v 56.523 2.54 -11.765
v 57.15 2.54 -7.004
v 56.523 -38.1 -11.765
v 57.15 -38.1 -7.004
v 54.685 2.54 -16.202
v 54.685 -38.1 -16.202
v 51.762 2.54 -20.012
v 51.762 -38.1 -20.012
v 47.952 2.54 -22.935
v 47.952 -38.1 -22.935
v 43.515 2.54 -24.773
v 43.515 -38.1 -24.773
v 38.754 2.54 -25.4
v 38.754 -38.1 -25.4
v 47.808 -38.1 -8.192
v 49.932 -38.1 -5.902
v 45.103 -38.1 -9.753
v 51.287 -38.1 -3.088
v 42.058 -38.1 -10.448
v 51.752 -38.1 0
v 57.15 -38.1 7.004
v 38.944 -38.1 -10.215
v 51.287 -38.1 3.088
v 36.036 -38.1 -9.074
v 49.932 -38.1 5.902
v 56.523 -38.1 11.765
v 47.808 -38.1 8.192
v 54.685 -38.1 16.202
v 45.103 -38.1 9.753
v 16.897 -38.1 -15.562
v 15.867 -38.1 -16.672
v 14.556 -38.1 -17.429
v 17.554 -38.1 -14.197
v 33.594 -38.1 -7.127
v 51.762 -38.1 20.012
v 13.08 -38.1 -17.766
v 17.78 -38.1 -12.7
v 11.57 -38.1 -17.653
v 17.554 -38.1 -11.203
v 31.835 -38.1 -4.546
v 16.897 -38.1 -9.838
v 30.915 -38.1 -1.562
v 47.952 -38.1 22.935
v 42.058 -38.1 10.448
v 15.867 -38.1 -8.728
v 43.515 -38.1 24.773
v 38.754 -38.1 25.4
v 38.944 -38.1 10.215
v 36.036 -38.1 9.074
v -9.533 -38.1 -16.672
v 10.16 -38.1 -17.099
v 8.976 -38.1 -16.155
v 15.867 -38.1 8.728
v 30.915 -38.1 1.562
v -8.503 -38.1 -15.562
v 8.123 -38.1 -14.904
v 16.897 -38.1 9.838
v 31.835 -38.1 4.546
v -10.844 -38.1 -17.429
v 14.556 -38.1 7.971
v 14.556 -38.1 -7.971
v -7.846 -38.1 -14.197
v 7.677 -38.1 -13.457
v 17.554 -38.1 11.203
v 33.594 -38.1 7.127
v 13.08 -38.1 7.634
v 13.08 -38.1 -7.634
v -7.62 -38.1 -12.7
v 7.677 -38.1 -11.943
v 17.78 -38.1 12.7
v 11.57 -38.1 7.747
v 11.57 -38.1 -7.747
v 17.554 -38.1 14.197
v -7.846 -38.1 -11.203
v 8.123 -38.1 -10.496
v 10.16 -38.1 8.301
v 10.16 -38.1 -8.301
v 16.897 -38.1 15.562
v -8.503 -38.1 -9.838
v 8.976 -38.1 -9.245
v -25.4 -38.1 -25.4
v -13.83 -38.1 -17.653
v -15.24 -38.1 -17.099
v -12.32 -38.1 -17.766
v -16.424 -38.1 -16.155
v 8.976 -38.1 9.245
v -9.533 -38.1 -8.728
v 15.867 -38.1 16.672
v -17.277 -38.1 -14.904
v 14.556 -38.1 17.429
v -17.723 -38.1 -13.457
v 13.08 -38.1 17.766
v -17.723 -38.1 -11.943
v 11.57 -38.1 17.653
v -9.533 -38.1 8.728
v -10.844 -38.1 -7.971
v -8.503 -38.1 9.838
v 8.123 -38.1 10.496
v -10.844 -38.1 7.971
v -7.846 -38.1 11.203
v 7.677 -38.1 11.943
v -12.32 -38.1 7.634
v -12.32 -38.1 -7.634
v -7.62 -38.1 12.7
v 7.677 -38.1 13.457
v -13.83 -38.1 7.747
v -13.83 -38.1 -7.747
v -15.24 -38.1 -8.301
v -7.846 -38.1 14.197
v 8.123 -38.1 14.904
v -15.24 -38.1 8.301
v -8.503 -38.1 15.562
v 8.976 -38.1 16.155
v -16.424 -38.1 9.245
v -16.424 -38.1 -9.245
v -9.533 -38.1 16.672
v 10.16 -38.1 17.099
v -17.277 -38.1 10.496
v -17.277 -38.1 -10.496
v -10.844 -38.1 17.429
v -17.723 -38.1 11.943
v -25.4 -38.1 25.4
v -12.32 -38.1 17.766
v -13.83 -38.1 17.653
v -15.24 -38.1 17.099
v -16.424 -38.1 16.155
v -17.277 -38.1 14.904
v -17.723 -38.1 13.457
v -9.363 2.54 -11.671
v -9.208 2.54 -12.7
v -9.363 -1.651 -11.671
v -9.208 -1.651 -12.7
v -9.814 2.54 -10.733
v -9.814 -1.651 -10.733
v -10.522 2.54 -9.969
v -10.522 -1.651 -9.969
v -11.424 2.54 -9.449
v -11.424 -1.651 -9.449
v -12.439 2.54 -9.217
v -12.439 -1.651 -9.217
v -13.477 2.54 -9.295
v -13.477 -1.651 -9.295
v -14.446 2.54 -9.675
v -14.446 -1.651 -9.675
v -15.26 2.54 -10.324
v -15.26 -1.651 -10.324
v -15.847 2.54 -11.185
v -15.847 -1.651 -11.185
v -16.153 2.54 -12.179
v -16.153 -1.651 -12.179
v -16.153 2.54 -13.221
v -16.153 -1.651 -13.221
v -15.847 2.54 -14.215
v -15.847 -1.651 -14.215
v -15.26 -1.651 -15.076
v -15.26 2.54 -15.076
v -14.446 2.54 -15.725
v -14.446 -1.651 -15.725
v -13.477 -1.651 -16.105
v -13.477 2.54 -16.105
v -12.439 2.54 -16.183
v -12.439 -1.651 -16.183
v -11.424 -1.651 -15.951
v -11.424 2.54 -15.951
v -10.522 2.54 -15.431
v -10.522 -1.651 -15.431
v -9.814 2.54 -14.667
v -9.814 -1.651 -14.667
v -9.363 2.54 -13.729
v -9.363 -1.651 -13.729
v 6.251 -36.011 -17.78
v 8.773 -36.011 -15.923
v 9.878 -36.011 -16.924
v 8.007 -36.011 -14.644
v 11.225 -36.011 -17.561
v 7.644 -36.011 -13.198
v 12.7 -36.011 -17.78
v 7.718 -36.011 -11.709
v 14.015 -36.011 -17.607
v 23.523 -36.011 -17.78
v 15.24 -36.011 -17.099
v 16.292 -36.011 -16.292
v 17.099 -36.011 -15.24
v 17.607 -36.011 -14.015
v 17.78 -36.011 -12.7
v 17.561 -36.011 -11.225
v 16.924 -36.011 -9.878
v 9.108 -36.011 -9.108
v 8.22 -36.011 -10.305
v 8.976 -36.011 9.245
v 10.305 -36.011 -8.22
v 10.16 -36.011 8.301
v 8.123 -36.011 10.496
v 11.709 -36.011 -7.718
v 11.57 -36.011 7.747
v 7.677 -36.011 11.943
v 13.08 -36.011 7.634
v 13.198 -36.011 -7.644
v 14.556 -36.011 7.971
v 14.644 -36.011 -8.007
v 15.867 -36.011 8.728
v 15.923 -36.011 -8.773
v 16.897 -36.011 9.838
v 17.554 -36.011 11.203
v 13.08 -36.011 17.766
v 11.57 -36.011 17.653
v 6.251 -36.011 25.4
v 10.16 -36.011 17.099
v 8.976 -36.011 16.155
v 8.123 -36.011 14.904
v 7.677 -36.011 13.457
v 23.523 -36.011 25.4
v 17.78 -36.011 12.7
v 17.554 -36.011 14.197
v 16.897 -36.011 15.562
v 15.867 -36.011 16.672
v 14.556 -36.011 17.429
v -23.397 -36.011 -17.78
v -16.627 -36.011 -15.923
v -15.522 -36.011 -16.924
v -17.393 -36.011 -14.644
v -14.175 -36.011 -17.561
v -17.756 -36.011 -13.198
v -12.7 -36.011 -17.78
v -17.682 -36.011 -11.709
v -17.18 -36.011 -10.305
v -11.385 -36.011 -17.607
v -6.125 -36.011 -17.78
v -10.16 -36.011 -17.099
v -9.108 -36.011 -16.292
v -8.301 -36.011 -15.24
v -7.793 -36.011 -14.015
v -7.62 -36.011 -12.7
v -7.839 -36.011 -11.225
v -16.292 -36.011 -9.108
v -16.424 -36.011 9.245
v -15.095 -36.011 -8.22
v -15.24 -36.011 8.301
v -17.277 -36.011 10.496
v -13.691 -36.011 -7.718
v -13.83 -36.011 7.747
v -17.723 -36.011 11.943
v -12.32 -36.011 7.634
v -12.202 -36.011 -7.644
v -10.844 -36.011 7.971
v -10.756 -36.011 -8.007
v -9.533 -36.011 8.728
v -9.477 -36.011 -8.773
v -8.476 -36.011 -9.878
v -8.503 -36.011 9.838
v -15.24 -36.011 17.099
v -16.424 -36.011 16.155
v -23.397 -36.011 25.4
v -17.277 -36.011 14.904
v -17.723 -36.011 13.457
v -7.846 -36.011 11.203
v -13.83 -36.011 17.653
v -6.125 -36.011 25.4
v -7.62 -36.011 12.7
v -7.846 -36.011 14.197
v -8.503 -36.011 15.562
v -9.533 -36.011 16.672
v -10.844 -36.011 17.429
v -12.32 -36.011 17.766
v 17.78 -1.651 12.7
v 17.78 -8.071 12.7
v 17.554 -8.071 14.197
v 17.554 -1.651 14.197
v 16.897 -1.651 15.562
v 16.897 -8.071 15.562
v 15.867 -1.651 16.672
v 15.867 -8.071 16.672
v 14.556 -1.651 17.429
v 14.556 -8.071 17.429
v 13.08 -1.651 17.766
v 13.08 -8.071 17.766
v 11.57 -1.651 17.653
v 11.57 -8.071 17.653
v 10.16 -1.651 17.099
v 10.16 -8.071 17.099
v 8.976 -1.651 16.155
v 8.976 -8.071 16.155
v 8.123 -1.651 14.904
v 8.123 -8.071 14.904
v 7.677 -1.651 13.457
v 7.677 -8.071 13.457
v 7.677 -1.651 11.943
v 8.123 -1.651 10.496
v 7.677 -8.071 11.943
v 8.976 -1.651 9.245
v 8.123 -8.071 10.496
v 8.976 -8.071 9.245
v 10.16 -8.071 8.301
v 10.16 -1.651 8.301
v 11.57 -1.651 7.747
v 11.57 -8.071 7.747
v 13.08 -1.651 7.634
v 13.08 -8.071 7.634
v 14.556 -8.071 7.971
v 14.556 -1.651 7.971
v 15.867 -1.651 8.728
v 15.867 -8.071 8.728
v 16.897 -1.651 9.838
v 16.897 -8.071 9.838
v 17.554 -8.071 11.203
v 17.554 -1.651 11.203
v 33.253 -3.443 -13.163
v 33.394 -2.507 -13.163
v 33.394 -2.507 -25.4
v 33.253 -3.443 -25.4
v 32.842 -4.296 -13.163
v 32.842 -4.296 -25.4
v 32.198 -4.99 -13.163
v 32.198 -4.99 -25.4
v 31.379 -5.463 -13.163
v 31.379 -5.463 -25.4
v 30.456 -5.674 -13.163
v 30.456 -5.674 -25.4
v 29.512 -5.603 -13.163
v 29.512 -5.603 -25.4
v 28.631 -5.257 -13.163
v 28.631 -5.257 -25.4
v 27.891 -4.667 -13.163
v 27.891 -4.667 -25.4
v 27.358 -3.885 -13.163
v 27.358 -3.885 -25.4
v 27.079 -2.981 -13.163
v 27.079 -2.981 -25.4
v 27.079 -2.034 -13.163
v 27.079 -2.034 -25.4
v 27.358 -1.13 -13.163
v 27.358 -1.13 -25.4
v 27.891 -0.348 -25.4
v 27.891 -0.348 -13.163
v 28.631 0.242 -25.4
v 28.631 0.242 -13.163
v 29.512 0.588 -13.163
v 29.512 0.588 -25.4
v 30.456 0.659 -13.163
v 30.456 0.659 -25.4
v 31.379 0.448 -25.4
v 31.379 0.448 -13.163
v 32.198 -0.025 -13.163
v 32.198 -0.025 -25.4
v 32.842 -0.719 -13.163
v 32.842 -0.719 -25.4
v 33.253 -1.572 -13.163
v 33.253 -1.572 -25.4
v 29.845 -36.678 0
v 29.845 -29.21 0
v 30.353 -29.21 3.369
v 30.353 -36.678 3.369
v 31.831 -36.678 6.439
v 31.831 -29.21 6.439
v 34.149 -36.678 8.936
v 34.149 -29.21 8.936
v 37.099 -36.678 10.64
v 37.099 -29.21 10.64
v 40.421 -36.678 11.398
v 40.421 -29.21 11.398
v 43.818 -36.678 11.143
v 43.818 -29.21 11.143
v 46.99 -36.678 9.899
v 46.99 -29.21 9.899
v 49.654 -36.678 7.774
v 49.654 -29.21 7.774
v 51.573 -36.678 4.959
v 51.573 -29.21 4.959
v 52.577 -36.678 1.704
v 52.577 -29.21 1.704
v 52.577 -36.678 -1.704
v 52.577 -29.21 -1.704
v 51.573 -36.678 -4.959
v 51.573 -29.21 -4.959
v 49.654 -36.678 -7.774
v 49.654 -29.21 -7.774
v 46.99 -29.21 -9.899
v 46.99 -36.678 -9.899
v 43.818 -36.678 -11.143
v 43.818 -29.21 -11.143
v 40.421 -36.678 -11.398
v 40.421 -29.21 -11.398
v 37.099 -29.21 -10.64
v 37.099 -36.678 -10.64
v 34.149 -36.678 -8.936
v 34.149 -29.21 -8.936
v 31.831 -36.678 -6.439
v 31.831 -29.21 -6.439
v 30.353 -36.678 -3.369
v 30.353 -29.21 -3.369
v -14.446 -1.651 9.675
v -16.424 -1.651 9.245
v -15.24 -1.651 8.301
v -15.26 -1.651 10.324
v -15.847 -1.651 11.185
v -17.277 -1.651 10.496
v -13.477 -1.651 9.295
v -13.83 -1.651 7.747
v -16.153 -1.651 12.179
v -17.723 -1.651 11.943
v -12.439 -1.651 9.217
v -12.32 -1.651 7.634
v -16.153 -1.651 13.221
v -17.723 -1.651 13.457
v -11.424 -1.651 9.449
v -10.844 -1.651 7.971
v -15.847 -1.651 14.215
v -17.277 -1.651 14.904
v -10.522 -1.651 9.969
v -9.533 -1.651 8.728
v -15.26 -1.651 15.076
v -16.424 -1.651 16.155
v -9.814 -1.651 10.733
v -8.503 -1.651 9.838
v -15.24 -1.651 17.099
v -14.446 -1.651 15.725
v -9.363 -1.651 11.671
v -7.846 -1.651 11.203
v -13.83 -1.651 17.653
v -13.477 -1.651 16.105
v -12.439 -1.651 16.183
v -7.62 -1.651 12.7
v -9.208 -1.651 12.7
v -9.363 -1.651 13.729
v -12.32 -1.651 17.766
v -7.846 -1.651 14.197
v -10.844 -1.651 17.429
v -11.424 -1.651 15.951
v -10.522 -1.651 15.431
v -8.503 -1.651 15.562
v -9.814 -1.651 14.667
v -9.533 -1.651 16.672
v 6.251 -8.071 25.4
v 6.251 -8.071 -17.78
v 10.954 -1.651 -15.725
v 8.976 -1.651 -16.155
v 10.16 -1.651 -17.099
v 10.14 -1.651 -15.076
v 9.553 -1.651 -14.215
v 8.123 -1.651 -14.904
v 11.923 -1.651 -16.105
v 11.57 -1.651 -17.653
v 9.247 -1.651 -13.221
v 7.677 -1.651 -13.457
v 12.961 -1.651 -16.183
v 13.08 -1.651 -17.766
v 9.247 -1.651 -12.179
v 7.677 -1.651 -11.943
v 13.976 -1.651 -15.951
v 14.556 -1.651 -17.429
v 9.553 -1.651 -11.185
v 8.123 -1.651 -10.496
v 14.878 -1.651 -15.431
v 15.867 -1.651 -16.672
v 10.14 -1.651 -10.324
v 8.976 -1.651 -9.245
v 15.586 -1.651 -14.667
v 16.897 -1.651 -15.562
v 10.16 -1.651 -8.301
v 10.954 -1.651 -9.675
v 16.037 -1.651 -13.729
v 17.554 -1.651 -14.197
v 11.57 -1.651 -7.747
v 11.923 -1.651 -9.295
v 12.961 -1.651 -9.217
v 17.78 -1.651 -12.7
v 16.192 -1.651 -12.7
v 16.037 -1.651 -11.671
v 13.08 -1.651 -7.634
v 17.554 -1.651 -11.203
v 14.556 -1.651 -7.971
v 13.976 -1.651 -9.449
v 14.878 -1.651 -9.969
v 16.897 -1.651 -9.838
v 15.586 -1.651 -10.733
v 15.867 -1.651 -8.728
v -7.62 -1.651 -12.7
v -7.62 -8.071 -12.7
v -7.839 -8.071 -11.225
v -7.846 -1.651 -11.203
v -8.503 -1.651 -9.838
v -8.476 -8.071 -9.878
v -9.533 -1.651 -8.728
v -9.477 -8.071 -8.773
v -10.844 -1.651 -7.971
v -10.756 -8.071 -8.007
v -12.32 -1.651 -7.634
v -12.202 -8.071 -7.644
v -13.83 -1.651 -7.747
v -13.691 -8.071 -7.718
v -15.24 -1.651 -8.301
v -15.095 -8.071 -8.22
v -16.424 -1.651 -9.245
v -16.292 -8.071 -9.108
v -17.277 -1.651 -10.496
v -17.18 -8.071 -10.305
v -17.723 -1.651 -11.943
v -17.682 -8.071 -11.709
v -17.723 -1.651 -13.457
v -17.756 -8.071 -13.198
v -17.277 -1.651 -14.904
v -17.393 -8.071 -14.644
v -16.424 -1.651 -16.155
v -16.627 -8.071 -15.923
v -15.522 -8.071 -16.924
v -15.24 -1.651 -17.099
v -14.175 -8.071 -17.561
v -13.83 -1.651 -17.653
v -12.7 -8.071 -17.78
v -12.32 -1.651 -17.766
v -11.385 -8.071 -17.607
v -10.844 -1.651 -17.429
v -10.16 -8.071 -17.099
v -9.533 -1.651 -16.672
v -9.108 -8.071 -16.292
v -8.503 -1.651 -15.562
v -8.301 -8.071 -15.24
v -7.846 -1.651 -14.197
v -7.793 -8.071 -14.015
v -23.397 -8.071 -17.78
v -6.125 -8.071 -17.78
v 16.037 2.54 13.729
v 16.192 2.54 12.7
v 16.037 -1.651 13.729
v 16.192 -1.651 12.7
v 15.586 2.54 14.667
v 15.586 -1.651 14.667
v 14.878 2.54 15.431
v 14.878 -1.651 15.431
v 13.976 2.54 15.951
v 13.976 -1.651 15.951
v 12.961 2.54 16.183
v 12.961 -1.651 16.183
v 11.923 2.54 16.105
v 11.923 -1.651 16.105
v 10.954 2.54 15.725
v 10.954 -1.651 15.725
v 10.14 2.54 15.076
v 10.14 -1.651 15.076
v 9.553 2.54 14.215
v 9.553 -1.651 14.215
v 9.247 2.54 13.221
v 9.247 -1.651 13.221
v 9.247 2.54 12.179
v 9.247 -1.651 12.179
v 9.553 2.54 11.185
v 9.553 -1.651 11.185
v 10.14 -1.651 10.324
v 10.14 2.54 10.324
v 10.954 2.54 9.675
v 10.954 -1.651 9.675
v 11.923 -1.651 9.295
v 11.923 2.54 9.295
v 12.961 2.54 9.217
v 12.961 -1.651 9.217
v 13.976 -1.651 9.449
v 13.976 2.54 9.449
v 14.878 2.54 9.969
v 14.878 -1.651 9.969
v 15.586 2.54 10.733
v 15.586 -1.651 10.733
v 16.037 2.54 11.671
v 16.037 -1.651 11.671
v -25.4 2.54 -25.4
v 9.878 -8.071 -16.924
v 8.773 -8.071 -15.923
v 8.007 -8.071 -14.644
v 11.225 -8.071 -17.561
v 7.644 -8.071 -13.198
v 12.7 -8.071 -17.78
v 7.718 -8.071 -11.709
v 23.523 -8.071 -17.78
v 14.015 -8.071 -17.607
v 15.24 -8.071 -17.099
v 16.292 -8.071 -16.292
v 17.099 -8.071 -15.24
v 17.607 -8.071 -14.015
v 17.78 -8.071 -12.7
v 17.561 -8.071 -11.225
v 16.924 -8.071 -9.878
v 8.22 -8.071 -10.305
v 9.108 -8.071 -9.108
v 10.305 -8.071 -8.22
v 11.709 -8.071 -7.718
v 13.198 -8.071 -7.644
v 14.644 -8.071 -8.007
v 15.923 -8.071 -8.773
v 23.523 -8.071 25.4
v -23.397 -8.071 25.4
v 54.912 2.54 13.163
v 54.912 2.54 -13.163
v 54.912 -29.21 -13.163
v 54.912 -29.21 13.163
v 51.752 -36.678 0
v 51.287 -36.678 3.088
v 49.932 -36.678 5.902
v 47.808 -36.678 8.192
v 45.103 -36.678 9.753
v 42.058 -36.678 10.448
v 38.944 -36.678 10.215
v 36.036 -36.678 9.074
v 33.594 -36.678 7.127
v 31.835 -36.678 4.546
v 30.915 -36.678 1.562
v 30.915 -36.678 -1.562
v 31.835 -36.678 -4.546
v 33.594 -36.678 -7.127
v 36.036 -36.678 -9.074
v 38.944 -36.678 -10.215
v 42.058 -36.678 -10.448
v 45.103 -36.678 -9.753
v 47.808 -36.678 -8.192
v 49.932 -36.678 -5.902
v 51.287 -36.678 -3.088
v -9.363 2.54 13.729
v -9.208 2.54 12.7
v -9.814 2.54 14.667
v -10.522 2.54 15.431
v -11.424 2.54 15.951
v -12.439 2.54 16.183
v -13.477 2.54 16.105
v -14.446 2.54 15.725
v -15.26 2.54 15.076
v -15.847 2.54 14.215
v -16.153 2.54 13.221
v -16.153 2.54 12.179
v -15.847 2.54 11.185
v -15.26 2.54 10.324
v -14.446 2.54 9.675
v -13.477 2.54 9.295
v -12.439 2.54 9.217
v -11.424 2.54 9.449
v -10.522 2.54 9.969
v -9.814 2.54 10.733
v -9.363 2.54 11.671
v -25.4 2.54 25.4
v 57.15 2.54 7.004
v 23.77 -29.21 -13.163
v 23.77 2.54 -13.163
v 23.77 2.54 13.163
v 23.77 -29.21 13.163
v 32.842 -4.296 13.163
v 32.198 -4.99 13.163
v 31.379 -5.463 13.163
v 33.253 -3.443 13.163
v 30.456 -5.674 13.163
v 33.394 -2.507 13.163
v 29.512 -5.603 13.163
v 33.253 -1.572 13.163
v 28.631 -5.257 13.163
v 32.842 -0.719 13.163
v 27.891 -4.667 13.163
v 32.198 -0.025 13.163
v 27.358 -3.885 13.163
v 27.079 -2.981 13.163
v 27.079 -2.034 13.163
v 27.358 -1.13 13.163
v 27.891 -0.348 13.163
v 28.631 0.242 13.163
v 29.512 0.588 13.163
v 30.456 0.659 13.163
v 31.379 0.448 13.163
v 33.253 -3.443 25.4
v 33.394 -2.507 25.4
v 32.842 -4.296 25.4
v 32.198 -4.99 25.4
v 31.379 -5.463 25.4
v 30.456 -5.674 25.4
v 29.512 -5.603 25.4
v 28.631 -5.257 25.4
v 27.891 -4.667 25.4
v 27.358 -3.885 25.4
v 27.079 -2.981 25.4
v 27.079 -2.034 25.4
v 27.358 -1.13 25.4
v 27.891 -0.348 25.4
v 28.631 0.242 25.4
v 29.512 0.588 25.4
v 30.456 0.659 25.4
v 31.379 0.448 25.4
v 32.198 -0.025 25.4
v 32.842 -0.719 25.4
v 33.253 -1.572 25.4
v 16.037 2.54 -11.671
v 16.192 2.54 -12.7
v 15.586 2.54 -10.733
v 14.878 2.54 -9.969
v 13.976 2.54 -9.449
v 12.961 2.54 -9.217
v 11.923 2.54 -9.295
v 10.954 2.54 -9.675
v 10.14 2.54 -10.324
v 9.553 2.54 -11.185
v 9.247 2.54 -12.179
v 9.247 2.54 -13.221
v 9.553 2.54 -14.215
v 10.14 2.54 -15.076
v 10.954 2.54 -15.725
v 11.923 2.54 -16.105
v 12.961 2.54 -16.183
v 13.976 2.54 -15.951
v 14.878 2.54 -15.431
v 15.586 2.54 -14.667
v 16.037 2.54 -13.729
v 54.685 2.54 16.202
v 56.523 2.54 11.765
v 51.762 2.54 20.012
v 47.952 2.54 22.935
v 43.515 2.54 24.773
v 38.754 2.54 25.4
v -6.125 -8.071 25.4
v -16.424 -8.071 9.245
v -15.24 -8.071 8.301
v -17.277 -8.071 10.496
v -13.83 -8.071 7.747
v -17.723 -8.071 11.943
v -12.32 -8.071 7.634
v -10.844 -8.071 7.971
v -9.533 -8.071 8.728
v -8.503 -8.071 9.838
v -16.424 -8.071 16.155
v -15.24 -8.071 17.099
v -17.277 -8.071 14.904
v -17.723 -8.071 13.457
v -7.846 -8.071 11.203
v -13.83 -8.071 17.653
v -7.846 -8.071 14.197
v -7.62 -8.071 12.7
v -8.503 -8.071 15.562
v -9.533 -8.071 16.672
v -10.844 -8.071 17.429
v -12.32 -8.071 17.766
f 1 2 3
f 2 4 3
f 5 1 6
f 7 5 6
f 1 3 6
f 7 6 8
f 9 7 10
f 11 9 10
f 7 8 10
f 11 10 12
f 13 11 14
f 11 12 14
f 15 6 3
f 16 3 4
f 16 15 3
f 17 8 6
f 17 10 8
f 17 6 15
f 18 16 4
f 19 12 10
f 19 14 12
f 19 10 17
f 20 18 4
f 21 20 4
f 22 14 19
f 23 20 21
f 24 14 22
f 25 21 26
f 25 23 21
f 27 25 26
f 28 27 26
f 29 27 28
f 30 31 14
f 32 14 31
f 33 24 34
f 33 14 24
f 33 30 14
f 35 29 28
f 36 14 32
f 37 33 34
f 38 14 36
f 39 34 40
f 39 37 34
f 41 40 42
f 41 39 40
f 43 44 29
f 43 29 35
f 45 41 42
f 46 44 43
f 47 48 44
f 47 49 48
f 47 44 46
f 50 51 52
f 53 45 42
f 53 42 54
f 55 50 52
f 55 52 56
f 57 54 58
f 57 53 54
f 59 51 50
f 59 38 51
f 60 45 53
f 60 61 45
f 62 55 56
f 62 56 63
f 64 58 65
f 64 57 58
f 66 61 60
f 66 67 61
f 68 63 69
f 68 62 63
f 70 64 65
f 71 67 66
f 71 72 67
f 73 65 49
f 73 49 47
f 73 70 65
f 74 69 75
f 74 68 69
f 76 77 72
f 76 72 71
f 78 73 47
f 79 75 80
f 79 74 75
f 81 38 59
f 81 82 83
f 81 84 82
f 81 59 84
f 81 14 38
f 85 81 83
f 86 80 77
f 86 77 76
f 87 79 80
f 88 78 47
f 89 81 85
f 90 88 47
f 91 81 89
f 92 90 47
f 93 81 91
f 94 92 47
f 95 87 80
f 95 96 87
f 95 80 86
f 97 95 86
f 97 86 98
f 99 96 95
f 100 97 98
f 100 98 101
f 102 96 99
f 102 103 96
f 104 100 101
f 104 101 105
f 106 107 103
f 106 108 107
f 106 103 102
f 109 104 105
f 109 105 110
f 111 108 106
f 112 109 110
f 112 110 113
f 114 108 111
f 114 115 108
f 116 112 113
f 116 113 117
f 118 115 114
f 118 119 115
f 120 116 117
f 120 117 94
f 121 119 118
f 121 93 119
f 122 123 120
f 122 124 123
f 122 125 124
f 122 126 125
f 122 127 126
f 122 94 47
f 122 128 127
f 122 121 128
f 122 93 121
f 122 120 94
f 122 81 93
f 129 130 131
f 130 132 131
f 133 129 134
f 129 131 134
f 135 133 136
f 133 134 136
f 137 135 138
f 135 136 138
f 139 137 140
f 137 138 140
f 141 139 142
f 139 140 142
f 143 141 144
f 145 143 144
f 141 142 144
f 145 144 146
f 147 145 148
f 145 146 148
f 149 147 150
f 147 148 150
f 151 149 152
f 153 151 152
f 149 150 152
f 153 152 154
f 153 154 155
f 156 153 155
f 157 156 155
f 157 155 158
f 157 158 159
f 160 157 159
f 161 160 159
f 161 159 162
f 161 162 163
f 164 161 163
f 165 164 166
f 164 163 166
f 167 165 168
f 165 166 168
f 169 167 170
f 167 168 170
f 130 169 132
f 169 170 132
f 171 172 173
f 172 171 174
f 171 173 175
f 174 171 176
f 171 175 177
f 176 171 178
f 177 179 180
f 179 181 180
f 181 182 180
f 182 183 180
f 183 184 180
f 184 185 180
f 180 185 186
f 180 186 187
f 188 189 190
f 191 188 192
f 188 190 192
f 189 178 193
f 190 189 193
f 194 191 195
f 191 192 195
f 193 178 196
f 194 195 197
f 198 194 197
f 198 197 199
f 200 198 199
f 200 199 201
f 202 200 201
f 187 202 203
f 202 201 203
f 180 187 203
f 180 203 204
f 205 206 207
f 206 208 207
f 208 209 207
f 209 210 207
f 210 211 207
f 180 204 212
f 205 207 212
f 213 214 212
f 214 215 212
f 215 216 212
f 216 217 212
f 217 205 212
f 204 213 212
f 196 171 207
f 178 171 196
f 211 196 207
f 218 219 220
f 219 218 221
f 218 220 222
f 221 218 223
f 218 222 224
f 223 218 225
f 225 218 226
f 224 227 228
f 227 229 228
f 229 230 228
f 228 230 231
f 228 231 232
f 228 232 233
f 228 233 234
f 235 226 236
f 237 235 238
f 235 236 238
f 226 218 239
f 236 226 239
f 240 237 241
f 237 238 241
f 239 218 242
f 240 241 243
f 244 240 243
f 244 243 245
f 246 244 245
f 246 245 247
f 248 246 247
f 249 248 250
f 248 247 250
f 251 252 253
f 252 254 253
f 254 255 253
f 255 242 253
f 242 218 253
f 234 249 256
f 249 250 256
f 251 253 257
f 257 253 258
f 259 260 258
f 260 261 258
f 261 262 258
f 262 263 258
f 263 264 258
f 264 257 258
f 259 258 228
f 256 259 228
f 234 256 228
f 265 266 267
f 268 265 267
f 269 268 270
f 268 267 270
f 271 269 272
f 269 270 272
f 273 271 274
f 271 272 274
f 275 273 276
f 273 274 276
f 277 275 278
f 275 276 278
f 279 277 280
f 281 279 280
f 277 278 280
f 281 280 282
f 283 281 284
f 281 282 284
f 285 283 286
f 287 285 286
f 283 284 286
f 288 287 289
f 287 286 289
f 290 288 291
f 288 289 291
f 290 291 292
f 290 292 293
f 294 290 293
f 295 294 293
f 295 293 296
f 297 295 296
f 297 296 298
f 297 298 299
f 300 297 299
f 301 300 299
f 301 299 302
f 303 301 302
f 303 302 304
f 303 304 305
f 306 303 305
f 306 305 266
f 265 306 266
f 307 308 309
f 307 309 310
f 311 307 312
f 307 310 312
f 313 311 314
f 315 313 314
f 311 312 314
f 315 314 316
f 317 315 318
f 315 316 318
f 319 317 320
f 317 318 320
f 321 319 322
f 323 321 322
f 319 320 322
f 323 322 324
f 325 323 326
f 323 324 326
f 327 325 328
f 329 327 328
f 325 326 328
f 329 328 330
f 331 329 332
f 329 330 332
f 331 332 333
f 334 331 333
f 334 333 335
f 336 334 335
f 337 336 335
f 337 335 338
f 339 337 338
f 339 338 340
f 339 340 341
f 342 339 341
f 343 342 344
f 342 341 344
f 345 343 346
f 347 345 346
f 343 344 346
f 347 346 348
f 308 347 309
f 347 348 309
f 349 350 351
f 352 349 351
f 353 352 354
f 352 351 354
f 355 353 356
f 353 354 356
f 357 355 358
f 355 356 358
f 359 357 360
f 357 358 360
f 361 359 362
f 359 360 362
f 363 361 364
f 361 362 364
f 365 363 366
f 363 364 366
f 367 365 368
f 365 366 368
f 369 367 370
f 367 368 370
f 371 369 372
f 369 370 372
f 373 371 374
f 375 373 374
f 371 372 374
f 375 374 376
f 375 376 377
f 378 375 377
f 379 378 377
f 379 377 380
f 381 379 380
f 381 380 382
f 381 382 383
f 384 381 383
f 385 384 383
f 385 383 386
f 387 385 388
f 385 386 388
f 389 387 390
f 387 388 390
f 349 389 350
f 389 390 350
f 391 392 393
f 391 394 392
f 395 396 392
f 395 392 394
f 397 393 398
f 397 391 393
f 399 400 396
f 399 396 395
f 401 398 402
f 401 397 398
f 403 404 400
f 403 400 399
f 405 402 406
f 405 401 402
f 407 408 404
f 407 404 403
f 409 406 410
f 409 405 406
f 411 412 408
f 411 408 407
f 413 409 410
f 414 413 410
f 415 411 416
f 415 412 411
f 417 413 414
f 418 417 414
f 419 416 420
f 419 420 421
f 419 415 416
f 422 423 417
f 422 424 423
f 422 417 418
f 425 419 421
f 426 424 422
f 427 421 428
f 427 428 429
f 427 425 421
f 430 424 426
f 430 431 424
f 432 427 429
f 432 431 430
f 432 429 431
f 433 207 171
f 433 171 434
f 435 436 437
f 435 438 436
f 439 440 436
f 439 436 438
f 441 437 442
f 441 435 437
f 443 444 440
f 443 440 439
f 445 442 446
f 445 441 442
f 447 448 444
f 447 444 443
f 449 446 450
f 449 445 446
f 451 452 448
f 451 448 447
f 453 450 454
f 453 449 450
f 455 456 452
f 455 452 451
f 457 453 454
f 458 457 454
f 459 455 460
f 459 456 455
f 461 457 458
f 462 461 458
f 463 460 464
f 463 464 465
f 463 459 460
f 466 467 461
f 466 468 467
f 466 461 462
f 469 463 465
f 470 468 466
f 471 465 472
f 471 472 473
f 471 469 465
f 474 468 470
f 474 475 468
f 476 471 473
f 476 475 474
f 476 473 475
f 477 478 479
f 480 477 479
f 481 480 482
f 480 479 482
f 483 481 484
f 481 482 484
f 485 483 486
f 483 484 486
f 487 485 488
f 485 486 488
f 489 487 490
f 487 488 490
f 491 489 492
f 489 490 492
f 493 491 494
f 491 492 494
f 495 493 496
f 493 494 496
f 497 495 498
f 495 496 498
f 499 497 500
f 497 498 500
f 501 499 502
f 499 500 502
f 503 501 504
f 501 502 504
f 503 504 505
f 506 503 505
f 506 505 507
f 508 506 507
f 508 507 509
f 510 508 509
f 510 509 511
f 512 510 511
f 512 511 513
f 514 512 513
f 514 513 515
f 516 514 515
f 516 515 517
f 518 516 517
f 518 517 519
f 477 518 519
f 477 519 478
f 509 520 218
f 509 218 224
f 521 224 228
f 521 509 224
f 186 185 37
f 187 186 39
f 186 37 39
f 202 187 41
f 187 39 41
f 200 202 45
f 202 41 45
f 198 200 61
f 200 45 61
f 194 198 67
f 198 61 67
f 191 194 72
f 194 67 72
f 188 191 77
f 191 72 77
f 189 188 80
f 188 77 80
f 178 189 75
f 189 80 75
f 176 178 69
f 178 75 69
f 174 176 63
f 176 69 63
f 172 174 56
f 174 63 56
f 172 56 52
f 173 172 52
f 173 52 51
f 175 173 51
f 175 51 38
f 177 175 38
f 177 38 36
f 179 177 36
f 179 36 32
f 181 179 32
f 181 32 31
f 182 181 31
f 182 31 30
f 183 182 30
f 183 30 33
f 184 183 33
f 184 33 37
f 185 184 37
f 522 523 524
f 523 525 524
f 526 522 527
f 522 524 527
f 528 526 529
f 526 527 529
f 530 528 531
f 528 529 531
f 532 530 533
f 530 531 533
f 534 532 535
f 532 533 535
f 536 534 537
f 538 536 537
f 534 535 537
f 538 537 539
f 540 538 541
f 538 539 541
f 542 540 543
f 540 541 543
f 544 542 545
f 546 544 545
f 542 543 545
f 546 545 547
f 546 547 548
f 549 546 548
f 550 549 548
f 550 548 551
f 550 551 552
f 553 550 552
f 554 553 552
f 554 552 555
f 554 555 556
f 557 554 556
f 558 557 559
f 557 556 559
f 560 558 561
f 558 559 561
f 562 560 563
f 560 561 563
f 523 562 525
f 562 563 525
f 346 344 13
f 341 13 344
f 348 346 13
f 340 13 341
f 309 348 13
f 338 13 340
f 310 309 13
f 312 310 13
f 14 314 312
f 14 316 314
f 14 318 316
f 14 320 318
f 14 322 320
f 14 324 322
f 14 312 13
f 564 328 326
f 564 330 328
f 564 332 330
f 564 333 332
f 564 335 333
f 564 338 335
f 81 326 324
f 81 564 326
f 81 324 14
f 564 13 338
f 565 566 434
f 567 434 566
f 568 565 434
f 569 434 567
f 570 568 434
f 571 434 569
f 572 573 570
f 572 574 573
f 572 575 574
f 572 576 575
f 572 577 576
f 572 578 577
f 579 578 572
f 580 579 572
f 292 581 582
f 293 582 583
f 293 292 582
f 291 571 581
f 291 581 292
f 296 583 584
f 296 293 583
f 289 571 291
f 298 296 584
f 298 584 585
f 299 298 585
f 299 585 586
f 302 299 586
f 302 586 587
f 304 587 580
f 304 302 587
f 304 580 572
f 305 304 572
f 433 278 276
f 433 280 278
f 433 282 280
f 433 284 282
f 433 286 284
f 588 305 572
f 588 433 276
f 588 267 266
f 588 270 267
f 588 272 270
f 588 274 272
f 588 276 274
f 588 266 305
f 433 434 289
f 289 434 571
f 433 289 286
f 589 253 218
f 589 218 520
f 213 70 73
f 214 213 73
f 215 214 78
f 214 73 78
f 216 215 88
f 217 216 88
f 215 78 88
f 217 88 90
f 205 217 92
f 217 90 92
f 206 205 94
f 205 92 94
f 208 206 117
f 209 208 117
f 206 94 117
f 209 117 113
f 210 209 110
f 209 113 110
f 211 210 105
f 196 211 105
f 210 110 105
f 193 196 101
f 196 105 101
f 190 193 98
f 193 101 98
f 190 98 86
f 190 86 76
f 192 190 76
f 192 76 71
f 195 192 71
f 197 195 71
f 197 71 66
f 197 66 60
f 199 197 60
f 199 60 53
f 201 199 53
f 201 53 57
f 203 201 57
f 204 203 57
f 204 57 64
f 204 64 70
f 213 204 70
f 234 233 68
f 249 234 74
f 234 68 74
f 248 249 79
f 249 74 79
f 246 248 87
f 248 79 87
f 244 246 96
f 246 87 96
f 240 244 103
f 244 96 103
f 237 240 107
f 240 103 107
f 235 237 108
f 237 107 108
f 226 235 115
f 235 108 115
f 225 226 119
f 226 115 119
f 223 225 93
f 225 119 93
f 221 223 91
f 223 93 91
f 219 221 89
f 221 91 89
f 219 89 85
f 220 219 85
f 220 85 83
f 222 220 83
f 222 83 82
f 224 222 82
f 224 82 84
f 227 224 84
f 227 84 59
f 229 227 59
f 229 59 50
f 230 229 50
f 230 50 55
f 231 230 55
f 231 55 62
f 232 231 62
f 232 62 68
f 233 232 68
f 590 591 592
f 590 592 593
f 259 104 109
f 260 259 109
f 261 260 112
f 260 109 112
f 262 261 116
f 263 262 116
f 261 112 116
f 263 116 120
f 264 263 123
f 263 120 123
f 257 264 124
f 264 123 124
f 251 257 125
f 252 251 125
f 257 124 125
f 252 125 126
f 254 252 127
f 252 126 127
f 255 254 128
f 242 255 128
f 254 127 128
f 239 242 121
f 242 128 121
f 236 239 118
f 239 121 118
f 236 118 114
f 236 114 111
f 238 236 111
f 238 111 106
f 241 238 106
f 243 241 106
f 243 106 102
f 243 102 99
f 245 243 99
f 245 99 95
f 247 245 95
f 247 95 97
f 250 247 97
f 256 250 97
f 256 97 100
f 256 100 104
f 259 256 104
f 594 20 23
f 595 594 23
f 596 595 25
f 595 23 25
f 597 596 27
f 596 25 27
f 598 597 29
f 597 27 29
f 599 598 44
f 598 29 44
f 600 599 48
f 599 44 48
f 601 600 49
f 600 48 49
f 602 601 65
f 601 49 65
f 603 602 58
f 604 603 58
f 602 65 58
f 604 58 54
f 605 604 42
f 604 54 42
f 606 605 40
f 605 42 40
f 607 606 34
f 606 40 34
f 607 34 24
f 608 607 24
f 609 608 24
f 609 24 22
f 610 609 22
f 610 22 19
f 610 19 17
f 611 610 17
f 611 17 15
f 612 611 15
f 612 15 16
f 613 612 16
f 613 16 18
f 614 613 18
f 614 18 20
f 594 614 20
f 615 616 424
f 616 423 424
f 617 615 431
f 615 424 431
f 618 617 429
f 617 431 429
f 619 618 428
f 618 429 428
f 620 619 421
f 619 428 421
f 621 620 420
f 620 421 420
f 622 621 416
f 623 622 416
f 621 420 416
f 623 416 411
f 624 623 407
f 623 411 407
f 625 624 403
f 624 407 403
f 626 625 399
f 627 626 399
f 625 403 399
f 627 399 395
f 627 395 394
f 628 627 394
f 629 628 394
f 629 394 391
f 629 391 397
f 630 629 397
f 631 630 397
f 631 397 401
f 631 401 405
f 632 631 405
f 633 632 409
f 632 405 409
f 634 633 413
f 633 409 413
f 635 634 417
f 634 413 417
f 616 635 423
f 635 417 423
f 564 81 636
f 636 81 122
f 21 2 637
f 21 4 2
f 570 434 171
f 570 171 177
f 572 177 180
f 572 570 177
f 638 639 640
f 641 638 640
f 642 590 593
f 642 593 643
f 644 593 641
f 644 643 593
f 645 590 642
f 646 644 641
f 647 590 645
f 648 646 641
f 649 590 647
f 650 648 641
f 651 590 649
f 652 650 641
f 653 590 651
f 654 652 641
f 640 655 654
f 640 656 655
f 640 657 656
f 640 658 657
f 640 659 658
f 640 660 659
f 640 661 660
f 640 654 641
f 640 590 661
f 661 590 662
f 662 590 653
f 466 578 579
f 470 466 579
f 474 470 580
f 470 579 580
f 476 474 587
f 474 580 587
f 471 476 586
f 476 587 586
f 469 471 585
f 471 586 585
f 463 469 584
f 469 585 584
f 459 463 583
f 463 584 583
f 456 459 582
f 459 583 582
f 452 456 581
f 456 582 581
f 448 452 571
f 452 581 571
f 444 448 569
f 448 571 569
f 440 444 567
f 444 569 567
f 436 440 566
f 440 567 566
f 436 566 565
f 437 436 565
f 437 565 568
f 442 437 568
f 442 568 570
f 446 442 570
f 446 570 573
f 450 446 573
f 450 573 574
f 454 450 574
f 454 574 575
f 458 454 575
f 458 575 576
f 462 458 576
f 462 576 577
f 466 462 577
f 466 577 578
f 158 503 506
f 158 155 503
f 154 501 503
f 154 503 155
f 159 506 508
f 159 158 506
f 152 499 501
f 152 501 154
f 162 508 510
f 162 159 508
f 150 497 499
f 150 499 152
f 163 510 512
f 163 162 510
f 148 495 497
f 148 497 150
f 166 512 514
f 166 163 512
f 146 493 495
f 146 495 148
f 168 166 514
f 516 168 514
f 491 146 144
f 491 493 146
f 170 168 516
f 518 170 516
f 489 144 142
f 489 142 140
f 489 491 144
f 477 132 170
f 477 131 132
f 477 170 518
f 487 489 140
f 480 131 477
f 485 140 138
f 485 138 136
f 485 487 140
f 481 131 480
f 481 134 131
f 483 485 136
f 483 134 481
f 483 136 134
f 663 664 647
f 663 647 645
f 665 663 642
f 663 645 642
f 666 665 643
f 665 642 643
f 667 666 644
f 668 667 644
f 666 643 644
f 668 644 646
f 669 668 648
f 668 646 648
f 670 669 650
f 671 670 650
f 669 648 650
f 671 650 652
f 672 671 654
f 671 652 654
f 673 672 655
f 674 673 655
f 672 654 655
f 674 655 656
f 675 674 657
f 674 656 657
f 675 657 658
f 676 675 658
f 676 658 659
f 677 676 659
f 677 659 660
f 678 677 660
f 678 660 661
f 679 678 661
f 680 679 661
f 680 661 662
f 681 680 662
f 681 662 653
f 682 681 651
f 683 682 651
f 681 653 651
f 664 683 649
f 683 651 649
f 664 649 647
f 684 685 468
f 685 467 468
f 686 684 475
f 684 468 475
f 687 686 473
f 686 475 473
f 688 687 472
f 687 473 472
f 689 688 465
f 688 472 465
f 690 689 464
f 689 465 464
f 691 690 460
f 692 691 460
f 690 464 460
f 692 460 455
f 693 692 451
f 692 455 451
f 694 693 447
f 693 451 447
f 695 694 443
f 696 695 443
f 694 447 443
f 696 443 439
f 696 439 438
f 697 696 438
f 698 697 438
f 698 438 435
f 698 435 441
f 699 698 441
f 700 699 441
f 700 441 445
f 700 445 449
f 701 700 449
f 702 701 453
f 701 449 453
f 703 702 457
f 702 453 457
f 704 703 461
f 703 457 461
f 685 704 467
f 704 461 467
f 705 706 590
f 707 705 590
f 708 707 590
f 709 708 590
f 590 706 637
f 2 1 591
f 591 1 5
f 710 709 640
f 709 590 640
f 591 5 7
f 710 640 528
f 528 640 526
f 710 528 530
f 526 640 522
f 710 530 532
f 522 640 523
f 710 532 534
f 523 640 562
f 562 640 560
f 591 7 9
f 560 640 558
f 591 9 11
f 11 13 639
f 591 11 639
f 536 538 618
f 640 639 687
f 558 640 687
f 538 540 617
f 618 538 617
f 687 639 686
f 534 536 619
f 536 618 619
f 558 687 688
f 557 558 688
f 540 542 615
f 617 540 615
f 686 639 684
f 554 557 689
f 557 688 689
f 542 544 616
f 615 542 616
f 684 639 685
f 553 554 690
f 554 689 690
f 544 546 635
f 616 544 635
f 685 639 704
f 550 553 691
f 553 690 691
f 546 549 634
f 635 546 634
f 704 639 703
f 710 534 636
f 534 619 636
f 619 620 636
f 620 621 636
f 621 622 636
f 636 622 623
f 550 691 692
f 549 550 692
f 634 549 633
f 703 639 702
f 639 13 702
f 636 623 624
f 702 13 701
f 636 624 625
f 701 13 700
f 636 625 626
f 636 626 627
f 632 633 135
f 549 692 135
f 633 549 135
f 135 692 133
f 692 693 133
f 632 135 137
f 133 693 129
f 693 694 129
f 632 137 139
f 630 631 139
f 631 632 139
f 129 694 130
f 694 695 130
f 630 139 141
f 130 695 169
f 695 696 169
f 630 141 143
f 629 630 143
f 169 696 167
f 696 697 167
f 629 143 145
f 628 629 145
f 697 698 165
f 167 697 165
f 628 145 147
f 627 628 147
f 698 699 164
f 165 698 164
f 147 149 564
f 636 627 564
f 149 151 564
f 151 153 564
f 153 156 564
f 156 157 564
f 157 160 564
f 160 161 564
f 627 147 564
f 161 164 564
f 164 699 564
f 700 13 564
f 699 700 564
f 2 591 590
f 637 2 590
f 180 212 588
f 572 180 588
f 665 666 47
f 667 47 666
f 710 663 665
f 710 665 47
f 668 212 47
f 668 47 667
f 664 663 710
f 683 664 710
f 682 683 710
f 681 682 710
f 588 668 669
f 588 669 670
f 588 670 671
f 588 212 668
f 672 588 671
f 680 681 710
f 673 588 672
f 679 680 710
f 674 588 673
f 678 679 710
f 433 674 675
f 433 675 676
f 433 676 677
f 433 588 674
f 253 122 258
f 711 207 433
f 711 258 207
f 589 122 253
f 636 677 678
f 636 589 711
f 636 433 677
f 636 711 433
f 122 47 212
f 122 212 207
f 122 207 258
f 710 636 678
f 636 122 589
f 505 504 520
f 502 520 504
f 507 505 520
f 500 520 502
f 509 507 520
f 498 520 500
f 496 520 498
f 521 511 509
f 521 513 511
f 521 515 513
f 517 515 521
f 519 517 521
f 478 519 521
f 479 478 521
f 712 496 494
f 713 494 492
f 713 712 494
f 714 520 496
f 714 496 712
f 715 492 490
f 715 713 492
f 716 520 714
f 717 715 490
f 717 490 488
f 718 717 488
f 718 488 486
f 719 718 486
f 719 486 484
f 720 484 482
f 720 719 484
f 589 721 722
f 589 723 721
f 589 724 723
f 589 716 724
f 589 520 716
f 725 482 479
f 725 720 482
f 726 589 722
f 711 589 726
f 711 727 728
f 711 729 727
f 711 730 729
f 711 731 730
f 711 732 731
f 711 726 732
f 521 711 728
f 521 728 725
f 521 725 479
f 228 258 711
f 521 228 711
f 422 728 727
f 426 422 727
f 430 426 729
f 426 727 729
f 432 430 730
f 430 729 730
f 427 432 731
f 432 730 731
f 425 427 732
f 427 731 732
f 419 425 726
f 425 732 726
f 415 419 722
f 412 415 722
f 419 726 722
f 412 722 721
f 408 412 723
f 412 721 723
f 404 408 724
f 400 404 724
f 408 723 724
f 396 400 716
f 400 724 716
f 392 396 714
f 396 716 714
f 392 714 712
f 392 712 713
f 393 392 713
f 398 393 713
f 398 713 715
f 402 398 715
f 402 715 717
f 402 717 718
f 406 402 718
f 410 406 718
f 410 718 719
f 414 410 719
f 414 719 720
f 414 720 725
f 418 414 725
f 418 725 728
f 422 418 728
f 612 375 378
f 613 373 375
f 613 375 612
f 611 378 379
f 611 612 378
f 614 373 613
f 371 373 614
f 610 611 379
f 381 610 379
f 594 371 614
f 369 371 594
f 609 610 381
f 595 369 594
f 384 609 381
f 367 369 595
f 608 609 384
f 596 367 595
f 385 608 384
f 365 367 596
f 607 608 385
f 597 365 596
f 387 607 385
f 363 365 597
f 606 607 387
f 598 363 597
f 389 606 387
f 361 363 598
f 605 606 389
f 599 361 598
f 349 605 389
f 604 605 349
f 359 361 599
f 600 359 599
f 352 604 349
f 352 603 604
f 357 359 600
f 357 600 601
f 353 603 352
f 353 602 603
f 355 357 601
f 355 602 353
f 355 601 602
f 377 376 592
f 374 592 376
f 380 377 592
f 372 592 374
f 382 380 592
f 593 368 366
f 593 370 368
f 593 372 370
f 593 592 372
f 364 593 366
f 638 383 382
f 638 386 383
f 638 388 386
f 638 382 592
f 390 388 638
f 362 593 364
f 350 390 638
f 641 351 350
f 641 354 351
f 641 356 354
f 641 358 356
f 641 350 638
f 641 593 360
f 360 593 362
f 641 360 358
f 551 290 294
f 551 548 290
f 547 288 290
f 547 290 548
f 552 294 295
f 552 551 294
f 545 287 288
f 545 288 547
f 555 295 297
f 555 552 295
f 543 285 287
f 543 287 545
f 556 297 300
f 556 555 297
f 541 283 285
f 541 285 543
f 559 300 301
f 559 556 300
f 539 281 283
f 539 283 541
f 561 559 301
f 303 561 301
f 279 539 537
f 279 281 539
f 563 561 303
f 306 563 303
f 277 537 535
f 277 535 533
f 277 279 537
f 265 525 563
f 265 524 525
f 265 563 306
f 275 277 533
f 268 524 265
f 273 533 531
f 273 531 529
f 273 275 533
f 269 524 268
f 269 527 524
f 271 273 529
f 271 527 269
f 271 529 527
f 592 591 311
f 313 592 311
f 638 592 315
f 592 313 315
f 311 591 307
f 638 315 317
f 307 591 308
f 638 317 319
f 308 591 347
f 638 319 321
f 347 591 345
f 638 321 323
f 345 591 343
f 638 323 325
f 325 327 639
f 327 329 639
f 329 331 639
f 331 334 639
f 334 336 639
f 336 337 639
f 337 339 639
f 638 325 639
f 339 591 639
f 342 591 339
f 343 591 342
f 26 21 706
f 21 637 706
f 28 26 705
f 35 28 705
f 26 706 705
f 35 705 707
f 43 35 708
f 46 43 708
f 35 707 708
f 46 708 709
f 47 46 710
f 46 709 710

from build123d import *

# Parameters (mm, degrees)
F0_W      = 50.8
F0_H      = 50.8
F0_R      = 3.4925
F1_DEPTH  = 38.1
F2_W      = 17.272
F2_H      = 27.94
F3_DEPTH  = 43.18
F4_R      = 5.08
F5_DEPTH  = 36.449
F6_DEPTH  = 2.54
F7_DEPTH  = 31.75
F9_W      = 31.1426110566
F9_H      = 46.6452091932
F10_DEPTH = 31.75
F8_R      = 10.4775
F11_DEPTH = 25.4
F12_R     = 11.43
F13_DEPTH = 7.4676
F14_DEPTH = 10.16
F15_DEPTH = 10.16
F16_R     = 18.3963073453
F17_R     = 3.175
F18_DEPTH = 57.912


with BuildPart() as f1:
    # F0 (on Front) → F1 (new body)
    with BuildSketch(Plane.XZ):
        Rectangle(F0_W, F0_H)
        with Locations((-12.7, -12.7)):
            Circle(F0_R, mode=Mode.SUBTRACT)
        with Locations((12.7, -12.7)):
            Circle(F0_R, mode=Mode.SUBTRACT)
        with Locations((-12.7, 12.7)):
            Circle(F0_R, mode=Mode.SUBTRACT)
        with Locations((12.7, 12.7)):
            Circle(F0_R, mode=Mode.SUBTRACT)
    extrude(amount=F1_DEPTH)

    # F2 (on face) → F3 (cut)
    with BuildSketch(Plane.XY.offset(25.4)):
        with Locations((14.8867284879, -22.0405142754)):
            Rectangle(F2_W, F2_H)
        with Locations((-14.7609785199, -22.0405142754)):
            Rectangle(F2_W, F2_H)
    extrude(amount=-F3_DEPTH, mode=Mode.SUBTRACT)

    # F4 (on face) → F5 (cut)
    with BuildSketch(Plane.XZ.offset(38.1)):
        with Locations((-12.7, 12.7)):
            Circle(F4_R)
        with Locations((12.7, 12.7)):
            Circle(F4_R)
        with Locations((-12.7, -12.7)):
            Circle(F4_R)
        with Locations((12.7, -12.7)):
            Circle(F4_R)
    extrude(amount=-F5_DEPTH, mode=Mode.SUBTRACT)

    # F6 (add): a face of the model
    f6_faces = [f1.faces().sort_by_distance(p)[0] for p in [
        (0, 0, 0),
    ]]
    extrude(f6_faces, amount=F6_DEPTH)

    # F7 (add): a face of the model
    f7_faces = [f1.faces().sort_by_distance(p)[0] for p in [
        (25.4, -17.78, 0),
    ]]
    extrude(f7_faces, amount=F7_DEPTH)

    # F9 (on face) → F10 (cut)
    with BuildSketch(Plane(origin=(0, 2.54, 0), x_dir=(-1, 0, 0), z_dir=(0, 1, 0))):
        with Locations((-39.3411628902, 0)):
            Rectangle(F9_W, F9_H)
    extrude(amount=-F10_DEPTH, mode=Mode.SUBTRACT)

    # F8 (on face) → F11 (cut)
    with BuildSketch(Plane.XZ.offset(38.1)):
        with Locations((41.275, 0)):
            Circle(F8_R)
    extrude(amount=-F11_DEPTH, mode=Mode.SUBTRACT)

    # F12 (on face) → F13 (cut)
    with BuildSketch(Plane(origin=(0, -29.21, 0), x_dir=(-1, 0, 0), z_dir=(0, 1, 0))):
        with Locations((-41.275, 0)):
            Circle(F12_R)
    extrude(amount=-F13_DEPTH, mode=Mode.SUBTRACT)

    # F14 (add): a face of the model
    f14_faces = [f1.faces().sort_by_distance(p)[0] for p in [
        (39.3411628902, -13.335, 23.3226045966),
    ]]
    extrude(f14_faces, amount=F14_DEPTH)

    # F15 (add): a face of the model
    f15_faces = [f1.faces().sort_by_distance(p)[0] for p in [
        (39.3411628902, -13.335, -23.3226045966),
    ]]
    extrude(f15_faces, amount=F15_DEPTH)

    # F16
    f16_edges = [f1.edges().sort_by_distance(p)[0] for p in [
        (57.15, -17.78, 25.4),
        (57.15, -17.78, -25.4),
    ]]
    fillet(f16_edges, radius=F16_R)

    # F17 (on face) → F18 (cut, symmetric)
    with BuildSketch(Plane(origin=(0, 0, 13.1626045966), x_dir=(1, 0, 0), z_dir=(0, 0, -1))):
        with Locations((30.2186440676, 2.5074067526)):
            Circle(F17_R)
    extrude(amount=F18_DEPTH, both=True, mode=Mode.SUBTRACT)


solid = f1.part
